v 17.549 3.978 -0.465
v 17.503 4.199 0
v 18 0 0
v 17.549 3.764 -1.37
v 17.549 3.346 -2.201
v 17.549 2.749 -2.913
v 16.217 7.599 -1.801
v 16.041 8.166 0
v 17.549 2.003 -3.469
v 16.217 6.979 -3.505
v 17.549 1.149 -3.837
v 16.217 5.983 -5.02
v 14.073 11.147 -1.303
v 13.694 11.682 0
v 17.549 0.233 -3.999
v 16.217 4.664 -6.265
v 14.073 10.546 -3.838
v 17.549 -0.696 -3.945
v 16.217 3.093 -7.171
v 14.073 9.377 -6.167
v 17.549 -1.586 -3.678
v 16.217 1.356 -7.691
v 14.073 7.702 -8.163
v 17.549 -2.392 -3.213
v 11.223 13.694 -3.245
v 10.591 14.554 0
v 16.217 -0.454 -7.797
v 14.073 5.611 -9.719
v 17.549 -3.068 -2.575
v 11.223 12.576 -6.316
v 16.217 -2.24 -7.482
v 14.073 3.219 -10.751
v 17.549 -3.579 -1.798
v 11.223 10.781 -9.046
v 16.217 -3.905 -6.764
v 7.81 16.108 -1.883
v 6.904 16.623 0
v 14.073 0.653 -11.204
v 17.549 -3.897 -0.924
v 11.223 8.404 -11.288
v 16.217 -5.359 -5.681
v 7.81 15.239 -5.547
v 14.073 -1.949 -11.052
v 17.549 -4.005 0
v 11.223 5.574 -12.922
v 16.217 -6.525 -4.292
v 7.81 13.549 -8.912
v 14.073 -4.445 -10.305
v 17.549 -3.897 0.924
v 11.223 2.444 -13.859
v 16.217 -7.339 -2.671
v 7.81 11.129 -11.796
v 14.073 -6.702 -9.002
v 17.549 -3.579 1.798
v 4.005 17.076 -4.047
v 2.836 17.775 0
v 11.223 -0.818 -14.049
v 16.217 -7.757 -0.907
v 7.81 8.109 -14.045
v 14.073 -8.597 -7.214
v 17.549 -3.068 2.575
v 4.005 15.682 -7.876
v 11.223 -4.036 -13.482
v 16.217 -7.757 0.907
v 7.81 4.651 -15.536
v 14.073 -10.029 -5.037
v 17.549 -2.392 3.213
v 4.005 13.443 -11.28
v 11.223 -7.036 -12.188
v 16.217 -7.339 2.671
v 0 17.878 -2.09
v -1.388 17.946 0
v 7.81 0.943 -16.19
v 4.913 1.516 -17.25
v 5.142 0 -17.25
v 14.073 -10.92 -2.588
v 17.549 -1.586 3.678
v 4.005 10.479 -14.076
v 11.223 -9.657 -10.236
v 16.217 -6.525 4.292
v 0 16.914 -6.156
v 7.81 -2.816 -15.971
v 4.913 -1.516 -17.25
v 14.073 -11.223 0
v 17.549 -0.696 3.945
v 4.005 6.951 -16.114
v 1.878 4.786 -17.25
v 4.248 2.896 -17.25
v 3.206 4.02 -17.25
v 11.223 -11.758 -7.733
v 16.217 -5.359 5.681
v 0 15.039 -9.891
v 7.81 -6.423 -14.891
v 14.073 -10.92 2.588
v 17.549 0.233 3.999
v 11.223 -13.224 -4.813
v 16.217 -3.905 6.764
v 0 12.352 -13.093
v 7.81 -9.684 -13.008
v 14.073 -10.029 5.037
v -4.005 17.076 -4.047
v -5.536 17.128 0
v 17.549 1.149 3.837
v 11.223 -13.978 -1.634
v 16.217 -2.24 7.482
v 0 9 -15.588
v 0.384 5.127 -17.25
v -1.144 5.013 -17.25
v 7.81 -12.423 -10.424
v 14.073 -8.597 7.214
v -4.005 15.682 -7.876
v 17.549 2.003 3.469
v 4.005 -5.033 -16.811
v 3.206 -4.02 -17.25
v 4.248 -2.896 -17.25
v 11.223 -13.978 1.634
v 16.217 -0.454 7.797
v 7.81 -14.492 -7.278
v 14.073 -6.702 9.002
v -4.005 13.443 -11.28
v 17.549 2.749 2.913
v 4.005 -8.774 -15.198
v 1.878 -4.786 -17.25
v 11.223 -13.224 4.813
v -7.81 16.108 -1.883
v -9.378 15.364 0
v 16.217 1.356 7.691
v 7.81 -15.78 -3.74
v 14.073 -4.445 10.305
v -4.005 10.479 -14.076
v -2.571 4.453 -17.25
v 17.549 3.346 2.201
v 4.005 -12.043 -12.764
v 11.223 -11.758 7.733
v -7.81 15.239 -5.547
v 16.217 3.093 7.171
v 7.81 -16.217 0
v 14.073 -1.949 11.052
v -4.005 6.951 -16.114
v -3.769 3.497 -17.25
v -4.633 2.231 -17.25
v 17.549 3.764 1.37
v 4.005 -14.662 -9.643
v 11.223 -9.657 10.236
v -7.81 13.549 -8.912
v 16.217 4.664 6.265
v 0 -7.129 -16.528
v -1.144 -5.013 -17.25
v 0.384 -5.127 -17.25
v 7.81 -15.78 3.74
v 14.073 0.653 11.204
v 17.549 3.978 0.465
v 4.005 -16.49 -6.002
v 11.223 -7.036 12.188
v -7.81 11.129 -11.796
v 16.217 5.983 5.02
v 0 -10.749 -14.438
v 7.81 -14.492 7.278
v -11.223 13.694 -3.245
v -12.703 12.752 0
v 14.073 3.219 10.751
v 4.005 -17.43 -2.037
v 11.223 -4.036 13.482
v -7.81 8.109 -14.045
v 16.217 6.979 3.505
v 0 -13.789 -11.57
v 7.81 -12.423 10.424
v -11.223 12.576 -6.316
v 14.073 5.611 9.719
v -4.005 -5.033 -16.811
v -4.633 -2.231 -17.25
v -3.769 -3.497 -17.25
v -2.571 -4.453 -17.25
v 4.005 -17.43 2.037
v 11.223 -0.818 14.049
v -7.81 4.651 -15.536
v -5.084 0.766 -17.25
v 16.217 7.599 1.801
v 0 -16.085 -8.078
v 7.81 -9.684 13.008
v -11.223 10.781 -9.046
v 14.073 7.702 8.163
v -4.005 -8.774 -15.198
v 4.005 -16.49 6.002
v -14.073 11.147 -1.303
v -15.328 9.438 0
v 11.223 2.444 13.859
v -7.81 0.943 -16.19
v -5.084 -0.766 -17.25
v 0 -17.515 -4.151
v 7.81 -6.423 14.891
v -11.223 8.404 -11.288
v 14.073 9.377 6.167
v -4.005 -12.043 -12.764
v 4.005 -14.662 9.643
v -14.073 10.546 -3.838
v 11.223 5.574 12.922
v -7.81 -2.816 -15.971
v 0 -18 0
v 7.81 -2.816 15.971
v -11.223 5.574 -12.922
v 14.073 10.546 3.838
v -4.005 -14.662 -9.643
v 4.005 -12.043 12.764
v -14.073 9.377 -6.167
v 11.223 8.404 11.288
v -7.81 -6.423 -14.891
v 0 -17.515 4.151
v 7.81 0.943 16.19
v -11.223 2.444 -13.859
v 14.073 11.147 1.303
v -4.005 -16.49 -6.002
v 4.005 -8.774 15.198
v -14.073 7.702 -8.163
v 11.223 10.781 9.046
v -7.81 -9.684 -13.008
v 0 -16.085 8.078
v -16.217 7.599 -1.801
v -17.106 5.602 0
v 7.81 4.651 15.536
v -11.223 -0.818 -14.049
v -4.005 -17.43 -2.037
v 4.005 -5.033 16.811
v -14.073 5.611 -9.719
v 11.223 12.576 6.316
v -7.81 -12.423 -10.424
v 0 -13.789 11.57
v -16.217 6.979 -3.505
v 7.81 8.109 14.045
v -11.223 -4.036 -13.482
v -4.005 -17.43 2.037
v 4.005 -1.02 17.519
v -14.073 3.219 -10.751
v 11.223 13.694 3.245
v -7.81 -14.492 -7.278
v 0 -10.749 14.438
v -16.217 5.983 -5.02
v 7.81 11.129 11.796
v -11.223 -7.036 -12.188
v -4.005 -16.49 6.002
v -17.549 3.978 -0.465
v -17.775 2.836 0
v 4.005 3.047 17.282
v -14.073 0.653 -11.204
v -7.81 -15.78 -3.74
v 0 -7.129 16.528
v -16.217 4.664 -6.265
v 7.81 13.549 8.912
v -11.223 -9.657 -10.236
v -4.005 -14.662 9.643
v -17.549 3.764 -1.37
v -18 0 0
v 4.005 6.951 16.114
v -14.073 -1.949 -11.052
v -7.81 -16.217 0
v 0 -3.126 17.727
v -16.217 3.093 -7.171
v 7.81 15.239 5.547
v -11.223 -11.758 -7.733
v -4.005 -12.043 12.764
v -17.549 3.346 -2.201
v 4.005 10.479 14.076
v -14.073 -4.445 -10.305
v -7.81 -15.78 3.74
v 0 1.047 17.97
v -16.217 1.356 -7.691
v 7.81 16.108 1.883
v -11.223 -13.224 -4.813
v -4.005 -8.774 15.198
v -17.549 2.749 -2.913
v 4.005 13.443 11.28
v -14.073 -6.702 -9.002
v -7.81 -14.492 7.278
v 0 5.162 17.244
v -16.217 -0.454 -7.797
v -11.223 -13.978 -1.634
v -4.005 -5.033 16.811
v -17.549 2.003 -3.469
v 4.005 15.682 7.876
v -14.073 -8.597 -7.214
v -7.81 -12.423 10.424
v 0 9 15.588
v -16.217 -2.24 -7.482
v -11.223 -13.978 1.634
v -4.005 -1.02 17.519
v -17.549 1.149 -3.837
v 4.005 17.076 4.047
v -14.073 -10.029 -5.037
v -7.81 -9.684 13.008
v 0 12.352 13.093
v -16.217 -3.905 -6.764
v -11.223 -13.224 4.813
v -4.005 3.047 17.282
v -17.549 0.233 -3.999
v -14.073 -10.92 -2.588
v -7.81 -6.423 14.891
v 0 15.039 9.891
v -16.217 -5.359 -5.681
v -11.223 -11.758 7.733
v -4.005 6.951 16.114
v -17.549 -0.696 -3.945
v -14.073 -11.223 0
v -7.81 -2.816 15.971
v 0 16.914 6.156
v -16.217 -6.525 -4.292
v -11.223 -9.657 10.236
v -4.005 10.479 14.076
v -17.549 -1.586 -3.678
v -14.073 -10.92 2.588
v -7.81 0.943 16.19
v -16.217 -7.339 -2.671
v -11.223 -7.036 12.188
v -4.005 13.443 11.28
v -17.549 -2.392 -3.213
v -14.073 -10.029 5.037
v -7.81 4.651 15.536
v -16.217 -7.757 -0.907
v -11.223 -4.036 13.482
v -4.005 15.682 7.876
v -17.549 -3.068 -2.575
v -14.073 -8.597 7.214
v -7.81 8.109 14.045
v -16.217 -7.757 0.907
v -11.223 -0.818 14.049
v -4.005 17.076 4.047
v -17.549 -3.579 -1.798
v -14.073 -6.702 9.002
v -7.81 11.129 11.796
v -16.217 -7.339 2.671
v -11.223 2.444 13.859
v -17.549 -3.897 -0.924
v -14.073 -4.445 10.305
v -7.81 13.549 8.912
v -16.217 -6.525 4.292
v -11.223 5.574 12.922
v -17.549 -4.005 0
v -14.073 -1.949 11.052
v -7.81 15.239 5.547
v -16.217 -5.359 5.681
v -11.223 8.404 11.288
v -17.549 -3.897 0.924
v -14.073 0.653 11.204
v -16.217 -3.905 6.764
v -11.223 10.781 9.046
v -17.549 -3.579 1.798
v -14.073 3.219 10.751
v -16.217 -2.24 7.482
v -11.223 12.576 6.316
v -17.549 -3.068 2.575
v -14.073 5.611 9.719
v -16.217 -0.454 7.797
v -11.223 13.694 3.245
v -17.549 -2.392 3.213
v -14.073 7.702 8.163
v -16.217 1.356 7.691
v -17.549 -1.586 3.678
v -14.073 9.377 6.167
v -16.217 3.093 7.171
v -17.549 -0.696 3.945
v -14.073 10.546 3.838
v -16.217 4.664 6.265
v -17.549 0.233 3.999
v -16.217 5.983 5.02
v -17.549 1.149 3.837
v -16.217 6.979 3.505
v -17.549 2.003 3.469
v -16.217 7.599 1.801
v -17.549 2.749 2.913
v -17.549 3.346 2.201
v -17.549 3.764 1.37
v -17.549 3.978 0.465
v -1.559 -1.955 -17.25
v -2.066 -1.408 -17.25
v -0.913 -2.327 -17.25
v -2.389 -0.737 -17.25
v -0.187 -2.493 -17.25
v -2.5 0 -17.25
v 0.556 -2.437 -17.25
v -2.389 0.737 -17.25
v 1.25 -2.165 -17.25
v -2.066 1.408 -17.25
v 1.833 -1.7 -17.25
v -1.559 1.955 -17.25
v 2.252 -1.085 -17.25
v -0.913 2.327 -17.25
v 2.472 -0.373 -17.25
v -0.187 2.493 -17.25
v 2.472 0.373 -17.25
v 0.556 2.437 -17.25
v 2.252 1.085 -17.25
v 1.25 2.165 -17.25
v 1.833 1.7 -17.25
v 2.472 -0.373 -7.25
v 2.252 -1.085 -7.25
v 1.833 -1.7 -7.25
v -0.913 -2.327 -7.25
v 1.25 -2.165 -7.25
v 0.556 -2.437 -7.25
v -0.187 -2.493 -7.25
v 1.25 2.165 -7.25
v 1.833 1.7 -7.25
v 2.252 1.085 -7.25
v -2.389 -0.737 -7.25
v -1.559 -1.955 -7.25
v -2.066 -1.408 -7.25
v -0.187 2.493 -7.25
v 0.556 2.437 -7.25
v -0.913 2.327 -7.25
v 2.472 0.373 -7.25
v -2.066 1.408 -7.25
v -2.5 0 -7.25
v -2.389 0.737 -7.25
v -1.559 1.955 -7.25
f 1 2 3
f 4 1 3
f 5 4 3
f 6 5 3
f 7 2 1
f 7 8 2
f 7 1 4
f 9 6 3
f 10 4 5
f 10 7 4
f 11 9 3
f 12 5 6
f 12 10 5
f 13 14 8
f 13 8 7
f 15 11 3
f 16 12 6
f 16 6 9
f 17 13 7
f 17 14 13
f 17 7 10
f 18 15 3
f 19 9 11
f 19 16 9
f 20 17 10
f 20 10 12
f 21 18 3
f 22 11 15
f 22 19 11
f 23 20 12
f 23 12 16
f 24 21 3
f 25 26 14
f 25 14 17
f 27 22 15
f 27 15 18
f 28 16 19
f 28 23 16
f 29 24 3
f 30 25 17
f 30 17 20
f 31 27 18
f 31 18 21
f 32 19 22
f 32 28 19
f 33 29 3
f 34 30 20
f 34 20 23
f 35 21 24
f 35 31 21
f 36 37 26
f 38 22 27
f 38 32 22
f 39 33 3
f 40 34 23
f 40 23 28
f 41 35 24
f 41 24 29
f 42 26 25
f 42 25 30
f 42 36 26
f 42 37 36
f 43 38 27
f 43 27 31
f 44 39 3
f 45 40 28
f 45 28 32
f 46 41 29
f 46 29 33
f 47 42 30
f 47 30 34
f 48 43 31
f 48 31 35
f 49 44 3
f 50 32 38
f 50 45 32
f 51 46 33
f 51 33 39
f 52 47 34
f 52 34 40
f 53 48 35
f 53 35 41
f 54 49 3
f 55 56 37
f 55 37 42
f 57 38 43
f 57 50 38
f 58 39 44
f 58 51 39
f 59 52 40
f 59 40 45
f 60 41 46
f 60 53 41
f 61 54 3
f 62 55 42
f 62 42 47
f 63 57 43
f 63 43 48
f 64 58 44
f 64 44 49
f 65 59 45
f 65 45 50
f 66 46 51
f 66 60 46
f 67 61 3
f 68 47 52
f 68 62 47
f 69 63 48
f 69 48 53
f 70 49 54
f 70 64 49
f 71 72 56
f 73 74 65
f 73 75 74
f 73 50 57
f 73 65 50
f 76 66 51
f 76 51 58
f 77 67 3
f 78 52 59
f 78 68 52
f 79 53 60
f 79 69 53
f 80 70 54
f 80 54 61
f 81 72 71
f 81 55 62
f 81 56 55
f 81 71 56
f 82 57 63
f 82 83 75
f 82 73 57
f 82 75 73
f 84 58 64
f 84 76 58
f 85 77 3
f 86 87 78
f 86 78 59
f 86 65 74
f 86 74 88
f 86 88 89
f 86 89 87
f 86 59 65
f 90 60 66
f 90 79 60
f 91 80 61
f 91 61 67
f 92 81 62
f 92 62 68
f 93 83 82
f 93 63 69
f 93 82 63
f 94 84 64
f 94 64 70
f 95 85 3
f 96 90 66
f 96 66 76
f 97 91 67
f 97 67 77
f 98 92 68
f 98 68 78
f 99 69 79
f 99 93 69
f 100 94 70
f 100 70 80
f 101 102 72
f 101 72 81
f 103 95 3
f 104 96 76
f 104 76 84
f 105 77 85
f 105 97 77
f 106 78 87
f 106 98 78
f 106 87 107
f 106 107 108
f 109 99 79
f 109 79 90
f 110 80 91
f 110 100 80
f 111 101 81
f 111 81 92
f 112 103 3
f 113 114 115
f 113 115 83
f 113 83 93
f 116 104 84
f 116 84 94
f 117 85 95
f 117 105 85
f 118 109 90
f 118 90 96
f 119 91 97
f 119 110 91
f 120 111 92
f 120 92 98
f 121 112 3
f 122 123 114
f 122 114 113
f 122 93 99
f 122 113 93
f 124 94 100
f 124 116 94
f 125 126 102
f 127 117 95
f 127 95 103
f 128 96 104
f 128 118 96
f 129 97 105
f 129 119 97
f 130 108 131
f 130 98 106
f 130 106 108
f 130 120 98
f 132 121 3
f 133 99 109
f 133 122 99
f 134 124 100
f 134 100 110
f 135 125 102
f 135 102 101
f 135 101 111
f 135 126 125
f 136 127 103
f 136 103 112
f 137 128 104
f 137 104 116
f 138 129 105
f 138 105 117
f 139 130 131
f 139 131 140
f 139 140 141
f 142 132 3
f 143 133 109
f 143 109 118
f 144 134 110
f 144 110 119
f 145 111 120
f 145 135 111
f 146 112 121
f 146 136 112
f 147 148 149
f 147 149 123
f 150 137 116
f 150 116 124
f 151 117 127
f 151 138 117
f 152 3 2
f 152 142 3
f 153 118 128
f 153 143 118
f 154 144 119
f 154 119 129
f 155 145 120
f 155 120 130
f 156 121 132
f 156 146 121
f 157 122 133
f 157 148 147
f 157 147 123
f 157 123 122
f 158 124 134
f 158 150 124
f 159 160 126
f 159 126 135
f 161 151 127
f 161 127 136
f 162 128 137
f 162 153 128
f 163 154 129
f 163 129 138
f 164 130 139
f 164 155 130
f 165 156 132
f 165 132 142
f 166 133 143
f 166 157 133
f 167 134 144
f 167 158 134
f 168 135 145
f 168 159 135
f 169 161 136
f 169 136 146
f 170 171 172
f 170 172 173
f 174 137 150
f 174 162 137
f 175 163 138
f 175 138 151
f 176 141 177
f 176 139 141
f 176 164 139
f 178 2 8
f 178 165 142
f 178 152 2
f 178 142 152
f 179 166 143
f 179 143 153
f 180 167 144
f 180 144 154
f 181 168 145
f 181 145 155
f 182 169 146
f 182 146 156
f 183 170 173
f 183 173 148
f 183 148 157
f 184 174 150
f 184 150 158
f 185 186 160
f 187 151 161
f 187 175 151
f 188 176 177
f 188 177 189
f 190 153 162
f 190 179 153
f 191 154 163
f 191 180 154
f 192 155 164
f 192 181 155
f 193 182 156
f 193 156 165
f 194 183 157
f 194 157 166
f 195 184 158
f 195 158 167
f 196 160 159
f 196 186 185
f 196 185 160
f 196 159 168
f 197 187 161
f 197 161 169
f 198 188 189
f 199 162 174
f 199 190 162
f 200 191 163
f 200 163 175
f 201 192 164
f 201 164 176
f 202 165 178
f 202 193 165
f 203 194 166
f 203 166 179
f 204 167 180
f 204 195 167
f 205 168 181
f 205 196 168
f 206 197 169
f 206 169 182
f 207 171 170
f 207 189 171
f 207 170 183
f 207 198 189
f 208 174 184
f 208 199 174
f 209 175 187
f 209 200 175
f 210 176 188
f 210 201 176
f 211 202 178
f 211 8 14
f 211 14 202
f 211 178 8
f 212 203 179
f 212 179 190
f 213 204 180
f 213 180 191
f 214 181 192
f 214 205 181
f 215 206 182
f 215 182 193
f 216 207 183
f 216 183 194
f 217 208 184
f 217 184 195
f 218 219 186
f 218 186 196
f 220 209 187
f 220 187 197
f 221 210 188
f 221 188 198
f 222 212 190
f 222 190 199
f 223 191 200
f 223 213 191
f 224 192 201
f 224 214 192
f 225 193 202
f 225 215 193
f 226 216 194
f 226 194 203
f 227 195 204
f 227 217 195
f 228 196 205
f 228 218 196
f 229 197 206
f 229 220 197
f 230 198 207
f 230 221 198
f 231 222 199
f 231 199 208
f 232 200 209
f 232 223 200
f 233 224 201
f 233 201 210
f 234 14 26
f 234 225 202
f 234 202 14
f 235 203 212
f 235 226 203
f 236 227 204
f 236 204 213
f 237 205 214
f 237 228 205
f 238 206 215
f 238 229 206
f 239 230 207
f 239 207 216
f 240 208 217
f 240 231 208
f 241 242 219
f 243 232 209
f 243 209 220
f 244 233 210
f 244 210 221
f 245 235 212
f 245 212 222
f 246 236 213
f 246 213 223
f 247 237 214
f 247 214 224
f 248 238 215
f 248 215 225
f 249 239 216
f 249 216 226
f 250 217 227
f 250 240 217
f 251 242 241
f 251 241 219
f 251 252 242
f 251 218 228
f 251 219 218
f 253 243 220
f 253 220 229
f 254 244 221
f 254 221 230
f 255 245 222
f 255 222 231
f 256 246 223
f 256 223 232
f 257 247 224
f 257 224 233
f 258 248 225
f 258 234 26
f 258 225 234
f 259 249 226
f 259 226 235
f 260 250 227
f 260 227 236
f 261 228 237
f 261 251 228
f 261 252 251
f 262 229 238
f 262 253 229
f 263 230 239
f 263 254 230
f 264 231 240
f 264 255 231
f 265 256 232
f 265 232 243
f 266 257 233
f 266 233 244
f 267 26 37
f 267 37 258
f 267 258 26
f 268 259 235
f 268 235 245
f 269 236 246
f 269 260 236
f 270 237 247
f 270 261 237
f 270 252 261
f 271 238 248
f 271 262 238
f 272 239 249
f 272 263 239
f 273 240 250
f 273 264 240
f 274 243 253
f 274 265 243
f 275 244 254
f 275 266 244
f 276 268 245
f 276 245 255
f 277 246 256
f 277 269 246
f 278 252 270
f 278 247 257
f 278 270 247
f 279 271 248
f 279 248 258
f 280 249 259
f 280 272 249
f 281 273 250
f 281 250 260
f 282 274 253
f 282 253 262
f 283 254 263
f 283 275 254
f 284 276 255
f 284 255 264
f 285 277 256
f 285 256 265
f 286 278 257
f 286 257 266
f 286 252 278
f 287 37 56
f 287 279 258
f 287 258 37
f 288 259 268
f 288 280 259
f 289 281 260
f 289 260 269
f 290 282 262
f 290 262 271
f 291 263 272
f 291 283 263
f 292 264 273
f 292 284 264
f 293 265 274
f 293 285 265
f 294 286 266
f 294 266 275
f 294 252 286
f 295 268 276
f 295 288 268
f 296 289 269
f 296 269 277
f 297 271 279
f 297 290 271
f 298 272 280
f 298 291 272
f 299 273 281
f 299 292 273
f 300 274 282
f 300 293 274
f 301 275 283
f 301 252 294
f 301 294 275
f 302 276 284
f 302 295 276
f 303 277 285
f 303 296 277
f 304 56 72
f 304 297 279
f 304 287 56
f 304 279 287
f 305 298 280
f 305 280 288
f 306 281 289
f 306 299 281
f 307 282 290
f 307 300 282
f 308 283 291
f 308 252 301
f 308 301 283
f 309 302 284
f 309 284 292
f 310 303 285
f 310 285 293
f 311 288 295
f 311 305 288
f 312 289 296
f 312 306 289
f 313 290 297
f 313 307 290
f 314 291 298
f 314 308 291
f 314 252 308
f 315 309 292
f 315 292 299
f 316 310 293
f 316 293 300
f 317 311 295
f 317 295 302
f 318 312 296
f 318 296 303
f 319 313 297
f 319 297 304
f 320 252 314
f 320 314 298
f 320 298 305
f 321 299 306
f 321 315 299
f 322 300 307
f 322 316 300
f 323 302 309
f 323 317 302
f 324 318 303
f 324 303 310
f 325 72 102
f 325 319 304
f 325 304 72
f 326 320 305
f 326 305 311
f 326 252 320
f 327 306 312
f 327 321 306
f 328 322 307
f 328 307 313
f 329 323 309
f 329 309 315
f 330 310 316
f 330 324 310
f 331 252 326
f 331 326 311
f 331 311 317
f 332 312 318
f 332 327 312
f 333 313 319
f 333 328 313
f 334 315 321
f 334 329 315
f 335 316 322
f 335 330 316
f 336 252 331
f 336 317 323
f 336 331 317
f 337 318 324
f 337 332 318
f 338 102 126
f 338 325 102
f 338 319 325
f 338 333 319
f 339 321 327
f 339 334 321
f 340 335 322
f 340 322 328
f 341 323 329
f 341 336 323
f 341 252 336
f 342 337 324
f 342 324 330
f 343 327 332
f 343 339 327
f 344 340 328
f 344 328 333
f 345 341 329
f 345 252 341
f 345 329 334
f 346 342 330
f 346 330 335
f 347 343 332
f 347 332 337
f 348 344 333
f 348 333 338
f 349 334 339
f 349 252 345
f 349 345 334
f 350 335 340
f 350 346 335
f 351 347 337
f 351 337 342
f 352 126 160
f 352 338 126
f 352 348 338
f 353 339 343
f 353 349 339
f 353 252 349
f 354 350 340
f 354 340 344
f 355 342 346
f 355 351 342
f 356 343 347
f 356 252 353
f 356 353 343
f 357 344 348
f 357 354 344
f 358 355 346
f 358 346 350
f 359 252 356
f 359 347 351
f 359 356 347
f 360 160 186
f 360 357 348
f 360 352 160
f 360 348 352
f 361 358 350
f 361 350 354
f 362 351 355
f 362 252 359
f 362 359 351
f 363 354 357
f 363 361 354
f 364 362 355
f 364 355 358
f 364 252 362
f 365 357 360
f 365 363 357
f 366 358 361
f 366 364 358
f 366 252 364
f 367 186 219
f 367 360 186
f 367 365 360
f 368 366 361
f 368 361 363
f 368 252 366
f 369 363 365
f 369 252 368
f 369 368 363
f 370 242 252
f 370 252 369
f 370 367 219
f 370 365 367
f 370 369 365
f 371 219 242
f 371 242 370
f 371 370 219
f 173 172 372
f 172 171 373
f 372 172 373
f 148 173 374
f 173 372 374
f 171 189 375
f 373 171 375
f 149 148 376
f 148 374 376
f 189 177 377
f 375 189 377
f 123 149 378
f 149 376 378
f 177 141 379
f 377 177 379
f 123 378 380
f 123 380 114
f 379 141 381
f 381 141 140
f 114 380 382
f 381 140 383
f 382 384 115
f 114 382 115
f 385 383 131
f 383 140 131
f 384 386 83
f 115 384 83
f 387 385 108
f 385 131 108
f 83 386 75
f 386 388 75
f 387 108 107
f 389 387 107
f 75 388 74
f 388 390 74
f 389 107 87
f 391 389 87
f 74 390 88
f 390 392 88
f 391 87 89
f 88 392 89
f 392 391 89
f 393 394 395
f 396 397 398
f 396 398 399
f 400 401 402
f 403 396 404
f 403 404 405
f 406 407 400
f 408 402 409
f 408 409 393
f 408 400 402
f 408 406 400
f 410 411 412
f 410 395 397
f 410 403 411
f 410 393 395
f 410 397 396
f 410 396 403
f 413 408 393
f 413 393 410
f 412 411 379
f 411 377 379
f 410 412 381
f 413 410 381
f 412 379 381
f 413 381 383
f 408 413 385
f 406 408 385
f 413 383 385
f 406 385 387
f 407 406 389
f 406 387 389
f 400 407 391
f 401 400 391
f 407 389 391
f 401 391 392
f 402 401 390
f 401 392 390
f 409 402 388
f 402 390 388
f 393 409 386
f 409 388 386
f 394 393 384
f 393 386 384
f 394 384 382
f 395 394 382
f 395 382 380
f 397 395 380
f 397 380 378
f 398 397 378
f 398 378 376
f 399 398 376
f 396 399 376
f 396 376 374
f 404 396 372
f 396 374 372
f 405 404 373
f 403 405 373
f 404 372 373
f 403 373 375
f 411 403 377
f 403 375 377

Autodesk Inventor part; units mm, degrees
ref_plane "YZ Plane" through (0, 0, 0) normal (1, 0, 0) x (0, 1, 0)
ref_plane "XZ Plane" through (0, 0, 0) normal (0, 1, 0) x (-1, 0, 0)
sketch "Sketch1" plane through (0, 0, 0) normal (0, 0, 1) x (1, 0, 0)
  circle A0 centre (0, 0) radius 18
  line L0 (-18, 0) -> (18, 0)
  dimension "d0" = 36
  dimension "d1" = 36
revolve "Ball" add sketch "Sketch1" angle 360 about axis through (-18, 0, 0) along (1, 0, 0) picked at (3.4084, 4.9379) contours L0 A0
ref_plane "BottomCuttingPlane" through (0, 0, -17.25) normal (0, 0, 1) x (1, 0, 0)
sketch "CutBottomSketch" plane through (0, 0, -17.25) normal (0, 0, 1) x (1, 0, 0)
  circle A0 centre (0, 0) radius 5.1417 projected
extrude "FlattenBottom" cut sketch "CutBottomSketch" against normal blind 10
sketch "Anchor" plane through (0, 0, -17.25) normal (0, 0, -1) x (-1, 0, 0)
  circle A0 centre (0, 0) radius 5.1417 projected
  circle A1 centre (0, 0) radius 4
  circle A2 centre (0, 0) radius 2.5
  dimension "d6" = 8
  dimension "d7" = 5
extrude "Extrusion2" cut sketch "Anchor" against normal blind 10 contours A2
thread "Thread1" size "M5x0.8" class "6H" standard "ANSI Metric M Profile" full length
properties part number "JLF-TP-8YT_ball" material "Acrylic, Clear(1)"
